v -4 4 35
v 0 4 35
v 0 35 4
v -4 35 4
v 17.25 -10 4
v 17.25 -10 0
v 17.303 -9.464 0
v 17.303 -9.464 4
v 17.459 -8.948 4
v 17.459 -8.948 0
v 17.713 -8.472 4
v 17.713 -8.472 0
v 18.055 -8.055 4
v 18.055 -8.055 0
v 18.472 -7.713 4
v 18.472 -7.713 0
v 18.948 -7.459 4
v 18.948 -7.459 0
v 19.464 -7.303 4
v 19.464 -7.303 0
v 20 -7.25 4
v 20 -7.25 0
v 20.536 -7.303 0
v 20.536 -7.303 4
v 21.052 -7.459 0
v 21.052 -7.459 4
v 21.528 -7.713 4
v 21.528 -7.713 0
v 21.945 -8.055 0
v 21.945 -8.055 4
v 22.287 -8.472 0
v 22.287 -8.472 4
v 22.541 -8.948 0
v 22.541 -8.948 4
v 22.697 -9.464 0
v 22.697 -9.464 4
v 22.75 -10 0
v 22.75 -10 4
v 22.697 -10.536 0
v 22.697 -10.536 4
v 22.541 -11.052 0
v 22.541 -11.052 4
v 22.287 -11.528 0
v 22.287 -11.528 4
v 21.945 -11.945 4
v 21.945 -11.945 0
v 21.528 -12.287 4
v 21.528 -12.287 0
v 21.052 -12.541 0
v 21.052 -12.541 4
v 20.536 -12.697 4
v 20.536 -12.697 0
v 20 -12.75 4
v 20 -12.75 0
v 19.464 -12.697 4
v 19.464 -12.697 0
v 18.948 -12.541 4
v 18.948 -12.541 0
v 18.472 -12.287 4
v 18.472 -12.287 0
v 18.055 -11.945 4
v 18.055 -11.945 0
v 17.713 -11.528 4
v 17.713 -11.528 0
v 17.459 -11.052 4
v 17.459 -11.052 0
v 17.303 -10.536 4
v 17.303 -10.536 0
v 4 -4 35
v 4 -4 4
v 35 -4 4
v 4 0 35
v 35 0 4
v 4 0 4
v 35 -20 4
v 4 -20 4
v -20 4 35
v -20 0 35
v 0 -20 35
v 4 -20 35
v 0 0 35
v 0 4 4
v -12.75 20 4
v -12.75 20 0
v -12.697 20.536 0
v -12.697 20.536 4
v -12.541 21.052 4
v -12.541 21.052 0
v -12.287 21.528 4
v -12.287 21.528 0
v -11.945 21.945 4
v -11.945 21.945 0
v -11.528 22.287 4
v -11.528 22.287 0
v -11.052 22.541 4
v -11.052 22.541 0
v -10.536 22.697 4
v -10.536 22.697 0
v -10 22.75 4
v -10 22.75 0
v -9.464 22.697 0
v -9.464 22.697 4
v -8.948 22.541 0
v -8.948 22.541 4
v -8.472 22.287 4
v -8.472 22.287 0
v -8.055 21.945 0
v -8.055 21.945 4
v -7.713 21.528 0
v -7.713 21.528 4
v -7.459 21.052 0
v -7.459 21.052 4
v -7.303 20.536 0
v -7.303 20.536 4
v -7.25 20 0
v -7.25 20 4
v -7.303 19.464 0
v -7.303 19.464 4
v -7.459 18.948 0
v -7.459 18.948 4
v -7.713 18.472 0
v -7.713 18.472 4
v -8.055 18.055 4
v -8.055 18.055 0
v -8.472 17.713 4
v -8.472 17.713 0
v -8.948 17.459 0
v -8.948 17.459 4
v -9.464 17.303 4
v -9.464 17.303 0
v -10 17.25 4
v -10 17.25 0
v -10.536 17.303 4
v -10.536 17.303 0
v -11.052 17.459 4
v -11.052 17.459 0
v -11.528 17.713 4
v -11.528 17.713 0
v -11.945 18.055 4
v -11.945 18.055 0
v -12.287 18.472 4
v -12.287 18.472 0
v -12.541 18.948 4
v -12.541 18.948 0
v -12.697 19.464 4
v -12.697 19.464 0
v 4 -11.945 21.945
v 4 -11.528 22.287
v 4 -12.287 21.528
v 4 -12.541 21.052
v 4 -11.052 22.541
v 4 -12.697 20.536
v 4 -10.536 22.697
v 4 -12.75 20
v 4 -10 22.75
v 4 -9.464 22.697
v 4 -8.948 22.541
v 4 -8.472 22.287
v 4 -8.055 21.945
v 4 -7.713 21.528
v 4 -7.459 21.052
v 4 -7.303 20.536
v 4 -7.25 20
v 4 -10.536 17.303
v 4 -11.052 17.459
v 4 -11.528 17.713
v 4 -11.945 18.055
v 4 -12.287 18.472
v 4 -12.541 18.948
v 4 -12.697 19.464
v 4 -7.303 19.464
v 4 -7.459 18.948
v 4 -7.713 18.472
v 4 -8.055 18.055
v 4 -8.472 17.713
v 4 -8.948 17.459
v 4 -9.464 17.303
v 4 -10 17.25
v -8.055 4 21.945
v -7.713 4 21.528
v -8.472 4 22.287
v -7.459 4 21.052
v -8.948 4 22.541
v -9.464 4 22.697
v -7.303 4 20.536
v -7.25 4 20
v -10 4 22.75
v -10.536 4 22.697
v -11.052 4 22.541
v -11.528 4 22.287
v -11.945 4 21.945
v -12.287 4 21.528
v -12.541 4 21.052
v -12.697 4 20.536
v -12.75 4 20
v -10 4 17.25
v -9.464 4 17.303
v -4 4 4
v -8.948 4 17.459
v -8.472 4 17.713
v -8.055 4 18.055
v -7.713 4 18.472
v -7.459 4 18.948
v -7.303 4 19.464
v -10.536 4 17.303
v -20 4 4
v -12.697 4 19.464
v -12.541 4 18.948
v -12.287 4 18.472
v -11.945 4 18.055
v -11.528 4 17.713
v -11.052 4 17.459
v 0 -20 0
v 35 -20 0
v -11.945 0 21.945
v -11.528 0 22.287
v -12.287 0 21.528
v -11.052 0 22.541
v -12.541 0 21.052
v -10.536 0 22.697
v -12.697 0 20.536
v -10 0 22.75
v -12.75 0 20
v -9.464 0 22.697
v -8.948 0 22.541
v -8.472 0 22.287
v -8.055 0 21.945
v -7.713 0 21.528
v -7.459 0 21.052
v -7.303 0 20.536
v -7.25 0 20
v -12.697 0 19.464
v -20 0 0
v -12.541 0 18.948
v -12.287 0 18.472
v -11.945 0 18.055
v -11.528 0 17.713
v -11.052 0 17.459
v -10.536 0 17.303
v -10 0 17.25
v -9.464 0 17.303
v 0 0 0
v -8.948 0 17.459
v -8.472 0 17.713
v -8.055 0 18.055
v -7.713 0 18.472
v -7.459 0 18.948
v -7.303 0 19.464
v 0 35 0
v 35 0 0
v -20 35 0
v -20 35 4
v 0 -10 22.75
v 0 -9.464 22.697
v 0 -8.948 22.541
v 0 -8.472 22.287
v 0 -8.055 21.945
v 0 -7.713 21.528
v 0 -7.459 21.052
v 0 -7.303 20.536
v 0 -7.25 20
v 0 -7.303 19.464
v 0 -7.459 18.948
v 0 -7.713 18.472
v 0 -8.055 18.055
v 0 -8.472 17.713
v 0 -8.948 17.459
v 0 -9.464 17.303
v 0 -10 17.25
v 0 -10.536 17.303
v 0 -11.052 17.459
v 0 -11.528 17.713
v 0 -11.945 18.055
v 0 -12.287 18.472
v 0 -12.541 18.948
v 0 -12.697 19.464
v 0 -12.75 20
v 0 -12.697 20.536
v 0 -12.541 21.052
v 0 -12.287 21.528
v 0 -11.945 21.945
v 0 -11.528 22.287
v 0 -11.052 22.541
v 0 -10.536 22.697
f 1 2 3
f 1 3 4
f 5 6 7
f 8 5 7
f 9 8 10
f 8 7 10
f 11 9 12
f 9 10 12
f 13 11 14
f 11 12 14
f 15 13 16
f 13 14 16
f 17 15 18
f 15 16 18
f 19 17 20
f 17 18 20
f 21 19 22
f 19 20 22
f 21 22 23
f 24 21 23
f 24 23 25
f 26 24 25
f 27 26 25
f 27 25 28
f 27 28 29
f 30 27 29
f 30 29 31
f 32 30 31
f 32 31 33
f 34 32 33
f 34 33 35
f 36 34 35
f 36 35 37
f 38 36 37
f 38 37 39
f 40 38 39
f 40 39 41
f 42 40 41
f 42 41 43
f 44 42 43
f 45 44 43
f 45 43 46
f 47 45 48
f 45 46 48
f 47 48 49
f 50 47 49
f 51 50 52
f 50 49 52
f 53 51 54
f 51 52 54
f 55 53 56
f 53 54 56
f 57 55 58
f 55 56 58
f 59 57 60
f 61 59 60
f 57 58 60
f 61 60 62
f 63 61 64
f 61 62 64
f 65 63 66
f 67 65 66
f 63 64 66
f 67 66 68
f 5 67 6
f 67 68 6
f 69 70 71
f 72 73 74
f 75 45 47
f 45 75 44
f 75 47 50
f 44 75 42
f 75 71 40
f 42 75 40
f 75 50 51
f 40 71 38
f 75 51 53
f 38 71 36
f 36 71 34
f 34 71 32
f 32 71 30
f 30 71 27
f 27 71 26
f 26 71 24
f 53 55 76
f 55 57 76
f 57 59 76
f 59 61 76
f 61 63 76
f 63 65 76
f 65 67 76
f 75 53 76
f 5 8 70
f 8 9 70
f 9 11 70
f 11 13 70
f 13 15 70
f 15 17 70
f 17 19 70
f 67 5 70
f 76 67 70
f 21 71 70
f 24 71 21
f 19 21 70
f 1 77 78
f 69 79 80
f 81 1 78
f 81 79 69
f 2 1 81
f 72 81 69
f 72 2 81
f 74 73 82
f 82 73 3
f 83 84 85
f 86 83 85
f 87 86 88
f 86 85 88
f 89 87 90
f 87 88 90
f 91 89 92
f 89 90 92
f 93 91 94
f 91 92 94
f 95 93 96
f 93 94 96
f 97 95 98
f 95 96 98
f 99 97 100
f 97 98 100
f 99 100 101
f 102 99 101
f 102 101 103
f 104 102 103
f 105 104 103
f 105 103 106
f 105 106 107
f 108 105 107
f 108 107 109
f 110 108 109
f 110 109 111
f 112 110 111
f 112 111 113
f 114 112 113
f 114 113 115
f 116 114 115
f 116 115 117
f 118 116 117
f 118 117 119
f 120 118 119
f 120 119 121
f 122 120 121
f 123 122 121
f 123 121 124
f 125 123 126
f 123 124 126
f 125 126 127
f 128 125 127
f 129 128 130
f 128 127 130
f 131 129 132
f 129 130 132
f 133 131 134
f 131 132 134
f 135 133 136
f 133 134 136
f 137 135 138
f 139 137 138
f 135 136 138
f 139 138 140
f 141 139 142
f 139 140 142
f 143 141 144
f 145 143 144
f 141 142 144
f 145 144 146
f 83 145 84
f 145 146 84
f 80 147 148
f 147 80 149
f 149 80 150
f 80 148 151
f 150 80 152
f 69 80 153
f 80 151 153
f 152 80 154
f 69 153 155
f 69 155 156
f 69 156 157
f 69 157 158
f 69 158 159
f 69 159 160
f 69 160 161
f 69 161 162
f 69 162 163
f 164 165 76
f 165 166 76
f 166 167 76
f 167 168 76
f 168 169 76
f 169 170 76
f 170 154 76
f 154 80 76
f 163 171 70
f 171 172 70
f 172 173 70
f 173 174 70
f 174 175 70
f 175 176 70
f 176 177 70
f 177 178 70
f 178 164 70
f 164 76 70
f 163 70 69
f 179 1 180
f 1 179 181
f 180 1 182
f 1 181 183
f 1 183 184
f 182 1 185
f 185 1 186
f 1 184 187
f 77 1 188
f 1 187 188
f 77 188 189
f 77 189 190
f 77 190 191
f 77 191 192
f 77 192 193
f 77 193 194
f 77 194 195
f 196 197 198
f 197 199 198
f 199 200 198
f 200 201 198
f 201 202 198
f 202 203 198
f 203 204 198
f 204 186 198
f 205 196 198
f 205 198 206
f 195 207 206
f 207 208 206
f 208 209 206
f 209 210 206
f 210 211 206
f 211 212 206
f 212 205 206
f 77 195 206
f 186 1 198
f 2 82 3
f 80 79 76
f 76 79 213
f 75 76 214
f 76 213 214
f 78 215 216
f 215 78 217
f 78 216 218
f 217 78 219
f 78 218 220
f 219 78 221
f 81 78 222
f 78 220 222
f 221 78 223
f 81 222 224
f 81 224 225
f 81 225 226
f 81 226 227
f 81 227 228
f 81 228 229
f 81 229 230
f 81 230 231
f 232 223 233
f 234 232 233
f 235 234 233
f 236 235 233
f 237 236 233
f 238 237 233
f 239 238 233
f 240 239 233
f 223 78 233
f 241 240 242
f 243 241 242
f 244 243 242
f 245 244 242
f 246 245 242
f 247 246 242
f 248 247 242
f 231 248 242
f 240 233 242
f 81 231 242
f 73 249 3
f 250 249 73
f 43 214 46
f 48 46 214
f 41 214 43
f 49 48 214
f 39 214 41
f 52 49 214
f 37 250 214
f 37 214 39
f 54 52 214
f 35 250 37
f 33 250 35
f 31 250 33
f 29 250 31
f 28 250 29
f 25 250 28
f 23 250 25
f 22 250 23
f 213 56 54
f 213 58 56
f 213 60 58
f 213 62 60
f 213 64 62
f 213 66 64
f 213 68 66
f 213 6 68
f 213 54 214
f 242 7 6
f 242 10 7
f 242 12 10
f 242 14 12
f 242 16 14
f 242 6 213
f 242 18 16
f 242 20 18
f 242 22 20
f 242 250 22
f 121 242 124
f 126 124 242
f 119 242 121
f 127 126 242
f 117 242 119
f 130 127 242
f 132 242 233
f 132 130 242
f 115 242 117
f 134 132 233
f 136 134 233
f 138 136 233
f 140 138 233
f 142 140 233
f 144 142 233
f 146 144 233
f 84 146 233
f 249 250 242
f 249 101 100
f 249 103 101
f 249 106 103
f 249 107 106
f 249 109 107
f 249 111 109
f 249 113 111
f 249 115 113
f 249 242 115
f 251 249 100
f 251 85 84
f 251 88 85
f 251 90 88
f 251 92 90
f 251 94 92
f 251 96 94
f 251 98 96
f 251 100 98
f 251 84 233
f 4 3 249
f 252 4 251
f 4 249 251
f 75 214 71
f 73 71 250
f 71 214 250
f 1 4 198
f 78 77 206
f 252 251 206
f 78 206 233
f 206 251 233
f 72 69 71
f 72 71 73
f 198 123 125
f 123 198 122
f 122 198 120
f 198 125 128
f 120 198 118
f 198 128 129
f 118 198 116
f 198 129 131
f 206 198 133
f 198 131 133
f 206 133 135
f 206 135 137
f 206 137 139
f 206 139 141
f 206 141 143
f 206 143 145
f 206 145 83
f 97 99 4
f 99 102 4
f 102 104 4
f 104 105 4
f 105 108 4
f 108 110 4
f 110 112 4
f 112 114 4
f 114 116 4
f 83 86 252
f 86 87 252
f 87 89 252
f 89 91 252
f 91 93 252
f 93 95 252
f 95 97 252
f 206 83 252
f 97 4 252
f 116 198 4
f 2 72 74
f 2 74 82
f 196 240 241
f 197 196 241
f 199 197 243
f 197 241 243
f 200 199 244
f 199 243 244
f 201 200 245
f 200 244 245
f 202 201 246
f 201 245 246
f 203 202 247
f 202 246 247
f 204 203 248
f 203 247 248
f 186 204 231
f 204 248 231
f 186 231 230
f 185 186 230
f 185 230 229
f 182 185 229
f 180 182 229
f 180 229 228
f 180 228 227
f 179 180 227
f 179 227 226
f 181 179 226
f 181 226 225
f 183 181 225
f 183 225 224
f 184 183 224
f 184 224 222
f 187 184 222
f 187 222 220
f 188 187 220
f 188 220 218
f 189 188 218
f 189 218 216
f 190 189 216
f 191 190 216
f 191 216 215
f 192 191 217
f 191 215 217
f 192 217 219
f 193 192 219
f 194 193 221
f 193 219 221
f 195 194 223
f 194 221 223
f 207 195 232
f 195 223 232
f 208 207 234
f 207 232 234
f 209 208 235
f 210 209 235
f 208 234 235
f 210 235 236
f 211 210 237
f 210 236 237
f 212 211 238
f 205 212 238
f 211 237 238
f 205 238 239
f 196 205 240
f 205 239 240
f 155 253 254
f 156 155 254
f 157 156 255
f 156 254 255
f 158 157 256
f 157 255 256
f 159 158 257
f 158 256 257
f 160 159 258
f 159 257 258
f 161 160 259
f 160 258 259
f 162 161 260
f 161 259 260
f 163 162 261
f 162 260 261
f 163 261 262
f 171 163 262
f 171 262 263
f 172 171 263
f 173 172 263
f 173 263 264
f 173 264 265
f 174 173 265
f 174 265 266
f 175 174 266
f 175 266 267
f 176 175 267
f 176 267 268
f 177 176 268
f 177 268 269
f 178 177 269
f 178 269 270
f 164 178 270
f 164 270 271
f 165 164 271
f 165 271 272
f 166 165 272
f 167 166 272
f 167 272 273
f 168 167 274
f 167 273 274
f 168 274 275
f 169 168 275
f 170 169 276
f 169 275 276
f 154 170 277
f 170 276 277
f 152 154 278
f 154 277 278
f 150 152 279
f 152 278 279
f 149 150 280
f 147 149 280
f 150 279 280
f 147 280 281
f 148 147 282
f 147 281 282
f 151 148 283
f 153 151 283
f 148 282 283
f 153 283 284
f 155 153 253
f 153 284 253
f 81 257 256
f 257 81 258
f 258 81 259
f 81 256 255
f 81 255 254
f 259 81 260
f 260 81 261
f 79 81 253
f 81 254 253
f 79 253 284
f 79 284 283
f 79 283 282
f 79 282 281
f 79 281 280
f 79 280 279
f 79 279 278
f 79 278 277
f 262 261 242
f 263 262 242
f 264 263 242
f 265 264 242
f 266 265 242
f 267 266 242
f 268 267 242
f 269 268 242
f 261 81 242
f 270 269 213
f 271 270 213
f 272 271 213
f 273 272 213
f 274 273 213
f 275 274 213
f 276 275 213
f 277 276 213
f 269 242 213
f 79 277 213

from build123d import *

# Parameters (mm, degrees)
BOSS_EXTRUDE1_DEPTH = 4
BOSS_EXTRUDE2_DEPTH = 31
CHAMFER2_SIZE       = 31
CUT_EXTRUDE1_REACH  = 62.622
SKETCH3_R           = 2.75
CUT_EXTRUDE2_REACH  = 62.622
SKETCH4_R           = 2.75
CUT_EXTRUDE3_REACH  = 62.622
SKETCH5_R           = 2.75


with BuildPart() as part:
    # Sketch1 → Boss-Extrude1 (new body)
    with BuildSketch(Plane.XY):
        Polygon((0, 35), (35, 0), (35, -20), (0, -20), (0, 0), (-20, 0), (-20, 35), align=None)
    extrude(amount=BOSS_EXTRUDE1_DEPTH)

    # Sketch2 → Boss-Extrude2 (add)
    with BuildSketch(Plane.XY.offset(4)):
        Polygon((-20, 0), (0, 0), (0, -20), (4, -20), (4, -4), (35, -4), (35, 0), (4, 0), (0, 4), (0, 35), (-4, 35), (-4, 4), (-20, 4), align=None)
    extrude(amount=BOSS_EXTRUDE2_DEPTH)

    # Chamfer2
    chamfer2_edges = [part.edges().sort_by_distance(p)[0] for p in [
        (-2, 35, 35),
        (35, -2, 35),
    ]]
    chamfer(chamfer2_edges, length=CHAMFER2_SIZE)

    # Sketch3 → Cut-Extrude1 (cut, up to next)
    with BuildSketch(Plane(origin=(0, 0, 0), x_dir=(-1, 0, 0), z_dir=(0, 0, -1)), mode=Mode.PRIVATE) as cut_extrude1_sk1:
        with Locations((10, 20)):
            Circle(SKETCH3_R)
    cut_extrude1_tool1 = extrude(cut_extrude1_sk1.sketch, amount=-CUT_EXTRUDE1_REACH, mode=Mode.PRIVATE) & part.part
    # Sketch3 → Cut-Extrude1 (cut, up to next)
    with BuildSketch(Plane(origin=(0, 0, 0), x_dir=(-1, 0, 0), z_dir=(0, 0, -1)), mode=Mode.PRIVATE) as cut_extrude1_sk2:
        with Locations((-20, -10)):
            Circle(SKETCH3_R)
    cut_extrude1_tool2 = extrude(cut_extrude1_sk2.sketch, amount=-CUT_EXTRUDE1_REACH, mode=Mode.PRIVATE) & part.part
    add(cut_extrude1_tool1.solids().sort_by_distance((-10, 20, 0))[0], mode=Mode.SUBTRACT)
    add(cut_extrude1_tool2.solids().sort_by_distance((20, -10, 0))[0], mode=Mode.SUBTRACT)

    # Sketch4 → Cut-Extrude2 (cut, up to next)
    with BuildSketch(Plane.XZ, mode=Mode.PRIVATE) as cut_extrude2_sk1:
        with Locations(Location((-10, 20, 0), (0, 0, 270))):
            Circle(SKETCH4_R)
    cut_extrude2_tool1 = extrude(cut_extrude2_sk1.sketch, amount=-CUT_EXTRUDE2_REACH, mode=Mode.PRIVATE) & part.part
    add(cut_extrude2_tool1.solids().sort_by_distance((-10, 0, 20))[0], mode=Mode.SUBTRACT)

    # Sketch5 → Cut-Extrude3 (cut, up to next)
    with BuildSketch(Plane.ZY, mode=Mode.PRIVATE) as cut_extrude3_sk1:
        with Locations((20, -10)):
            Circle(SKETCH5_R)
    cut_extrude3_tool1 = extrude(cut_extrude3_sk1.sketch, amount=-CUT_EXTRUDE3_REACH, mode=Mode.PRIVATE) & part.part
    add(cut_extrude3_tool1.solids().sort_by_distance((0, -10, 20))[0], mode=Mode.SUBTRACT)


solid = part.part
